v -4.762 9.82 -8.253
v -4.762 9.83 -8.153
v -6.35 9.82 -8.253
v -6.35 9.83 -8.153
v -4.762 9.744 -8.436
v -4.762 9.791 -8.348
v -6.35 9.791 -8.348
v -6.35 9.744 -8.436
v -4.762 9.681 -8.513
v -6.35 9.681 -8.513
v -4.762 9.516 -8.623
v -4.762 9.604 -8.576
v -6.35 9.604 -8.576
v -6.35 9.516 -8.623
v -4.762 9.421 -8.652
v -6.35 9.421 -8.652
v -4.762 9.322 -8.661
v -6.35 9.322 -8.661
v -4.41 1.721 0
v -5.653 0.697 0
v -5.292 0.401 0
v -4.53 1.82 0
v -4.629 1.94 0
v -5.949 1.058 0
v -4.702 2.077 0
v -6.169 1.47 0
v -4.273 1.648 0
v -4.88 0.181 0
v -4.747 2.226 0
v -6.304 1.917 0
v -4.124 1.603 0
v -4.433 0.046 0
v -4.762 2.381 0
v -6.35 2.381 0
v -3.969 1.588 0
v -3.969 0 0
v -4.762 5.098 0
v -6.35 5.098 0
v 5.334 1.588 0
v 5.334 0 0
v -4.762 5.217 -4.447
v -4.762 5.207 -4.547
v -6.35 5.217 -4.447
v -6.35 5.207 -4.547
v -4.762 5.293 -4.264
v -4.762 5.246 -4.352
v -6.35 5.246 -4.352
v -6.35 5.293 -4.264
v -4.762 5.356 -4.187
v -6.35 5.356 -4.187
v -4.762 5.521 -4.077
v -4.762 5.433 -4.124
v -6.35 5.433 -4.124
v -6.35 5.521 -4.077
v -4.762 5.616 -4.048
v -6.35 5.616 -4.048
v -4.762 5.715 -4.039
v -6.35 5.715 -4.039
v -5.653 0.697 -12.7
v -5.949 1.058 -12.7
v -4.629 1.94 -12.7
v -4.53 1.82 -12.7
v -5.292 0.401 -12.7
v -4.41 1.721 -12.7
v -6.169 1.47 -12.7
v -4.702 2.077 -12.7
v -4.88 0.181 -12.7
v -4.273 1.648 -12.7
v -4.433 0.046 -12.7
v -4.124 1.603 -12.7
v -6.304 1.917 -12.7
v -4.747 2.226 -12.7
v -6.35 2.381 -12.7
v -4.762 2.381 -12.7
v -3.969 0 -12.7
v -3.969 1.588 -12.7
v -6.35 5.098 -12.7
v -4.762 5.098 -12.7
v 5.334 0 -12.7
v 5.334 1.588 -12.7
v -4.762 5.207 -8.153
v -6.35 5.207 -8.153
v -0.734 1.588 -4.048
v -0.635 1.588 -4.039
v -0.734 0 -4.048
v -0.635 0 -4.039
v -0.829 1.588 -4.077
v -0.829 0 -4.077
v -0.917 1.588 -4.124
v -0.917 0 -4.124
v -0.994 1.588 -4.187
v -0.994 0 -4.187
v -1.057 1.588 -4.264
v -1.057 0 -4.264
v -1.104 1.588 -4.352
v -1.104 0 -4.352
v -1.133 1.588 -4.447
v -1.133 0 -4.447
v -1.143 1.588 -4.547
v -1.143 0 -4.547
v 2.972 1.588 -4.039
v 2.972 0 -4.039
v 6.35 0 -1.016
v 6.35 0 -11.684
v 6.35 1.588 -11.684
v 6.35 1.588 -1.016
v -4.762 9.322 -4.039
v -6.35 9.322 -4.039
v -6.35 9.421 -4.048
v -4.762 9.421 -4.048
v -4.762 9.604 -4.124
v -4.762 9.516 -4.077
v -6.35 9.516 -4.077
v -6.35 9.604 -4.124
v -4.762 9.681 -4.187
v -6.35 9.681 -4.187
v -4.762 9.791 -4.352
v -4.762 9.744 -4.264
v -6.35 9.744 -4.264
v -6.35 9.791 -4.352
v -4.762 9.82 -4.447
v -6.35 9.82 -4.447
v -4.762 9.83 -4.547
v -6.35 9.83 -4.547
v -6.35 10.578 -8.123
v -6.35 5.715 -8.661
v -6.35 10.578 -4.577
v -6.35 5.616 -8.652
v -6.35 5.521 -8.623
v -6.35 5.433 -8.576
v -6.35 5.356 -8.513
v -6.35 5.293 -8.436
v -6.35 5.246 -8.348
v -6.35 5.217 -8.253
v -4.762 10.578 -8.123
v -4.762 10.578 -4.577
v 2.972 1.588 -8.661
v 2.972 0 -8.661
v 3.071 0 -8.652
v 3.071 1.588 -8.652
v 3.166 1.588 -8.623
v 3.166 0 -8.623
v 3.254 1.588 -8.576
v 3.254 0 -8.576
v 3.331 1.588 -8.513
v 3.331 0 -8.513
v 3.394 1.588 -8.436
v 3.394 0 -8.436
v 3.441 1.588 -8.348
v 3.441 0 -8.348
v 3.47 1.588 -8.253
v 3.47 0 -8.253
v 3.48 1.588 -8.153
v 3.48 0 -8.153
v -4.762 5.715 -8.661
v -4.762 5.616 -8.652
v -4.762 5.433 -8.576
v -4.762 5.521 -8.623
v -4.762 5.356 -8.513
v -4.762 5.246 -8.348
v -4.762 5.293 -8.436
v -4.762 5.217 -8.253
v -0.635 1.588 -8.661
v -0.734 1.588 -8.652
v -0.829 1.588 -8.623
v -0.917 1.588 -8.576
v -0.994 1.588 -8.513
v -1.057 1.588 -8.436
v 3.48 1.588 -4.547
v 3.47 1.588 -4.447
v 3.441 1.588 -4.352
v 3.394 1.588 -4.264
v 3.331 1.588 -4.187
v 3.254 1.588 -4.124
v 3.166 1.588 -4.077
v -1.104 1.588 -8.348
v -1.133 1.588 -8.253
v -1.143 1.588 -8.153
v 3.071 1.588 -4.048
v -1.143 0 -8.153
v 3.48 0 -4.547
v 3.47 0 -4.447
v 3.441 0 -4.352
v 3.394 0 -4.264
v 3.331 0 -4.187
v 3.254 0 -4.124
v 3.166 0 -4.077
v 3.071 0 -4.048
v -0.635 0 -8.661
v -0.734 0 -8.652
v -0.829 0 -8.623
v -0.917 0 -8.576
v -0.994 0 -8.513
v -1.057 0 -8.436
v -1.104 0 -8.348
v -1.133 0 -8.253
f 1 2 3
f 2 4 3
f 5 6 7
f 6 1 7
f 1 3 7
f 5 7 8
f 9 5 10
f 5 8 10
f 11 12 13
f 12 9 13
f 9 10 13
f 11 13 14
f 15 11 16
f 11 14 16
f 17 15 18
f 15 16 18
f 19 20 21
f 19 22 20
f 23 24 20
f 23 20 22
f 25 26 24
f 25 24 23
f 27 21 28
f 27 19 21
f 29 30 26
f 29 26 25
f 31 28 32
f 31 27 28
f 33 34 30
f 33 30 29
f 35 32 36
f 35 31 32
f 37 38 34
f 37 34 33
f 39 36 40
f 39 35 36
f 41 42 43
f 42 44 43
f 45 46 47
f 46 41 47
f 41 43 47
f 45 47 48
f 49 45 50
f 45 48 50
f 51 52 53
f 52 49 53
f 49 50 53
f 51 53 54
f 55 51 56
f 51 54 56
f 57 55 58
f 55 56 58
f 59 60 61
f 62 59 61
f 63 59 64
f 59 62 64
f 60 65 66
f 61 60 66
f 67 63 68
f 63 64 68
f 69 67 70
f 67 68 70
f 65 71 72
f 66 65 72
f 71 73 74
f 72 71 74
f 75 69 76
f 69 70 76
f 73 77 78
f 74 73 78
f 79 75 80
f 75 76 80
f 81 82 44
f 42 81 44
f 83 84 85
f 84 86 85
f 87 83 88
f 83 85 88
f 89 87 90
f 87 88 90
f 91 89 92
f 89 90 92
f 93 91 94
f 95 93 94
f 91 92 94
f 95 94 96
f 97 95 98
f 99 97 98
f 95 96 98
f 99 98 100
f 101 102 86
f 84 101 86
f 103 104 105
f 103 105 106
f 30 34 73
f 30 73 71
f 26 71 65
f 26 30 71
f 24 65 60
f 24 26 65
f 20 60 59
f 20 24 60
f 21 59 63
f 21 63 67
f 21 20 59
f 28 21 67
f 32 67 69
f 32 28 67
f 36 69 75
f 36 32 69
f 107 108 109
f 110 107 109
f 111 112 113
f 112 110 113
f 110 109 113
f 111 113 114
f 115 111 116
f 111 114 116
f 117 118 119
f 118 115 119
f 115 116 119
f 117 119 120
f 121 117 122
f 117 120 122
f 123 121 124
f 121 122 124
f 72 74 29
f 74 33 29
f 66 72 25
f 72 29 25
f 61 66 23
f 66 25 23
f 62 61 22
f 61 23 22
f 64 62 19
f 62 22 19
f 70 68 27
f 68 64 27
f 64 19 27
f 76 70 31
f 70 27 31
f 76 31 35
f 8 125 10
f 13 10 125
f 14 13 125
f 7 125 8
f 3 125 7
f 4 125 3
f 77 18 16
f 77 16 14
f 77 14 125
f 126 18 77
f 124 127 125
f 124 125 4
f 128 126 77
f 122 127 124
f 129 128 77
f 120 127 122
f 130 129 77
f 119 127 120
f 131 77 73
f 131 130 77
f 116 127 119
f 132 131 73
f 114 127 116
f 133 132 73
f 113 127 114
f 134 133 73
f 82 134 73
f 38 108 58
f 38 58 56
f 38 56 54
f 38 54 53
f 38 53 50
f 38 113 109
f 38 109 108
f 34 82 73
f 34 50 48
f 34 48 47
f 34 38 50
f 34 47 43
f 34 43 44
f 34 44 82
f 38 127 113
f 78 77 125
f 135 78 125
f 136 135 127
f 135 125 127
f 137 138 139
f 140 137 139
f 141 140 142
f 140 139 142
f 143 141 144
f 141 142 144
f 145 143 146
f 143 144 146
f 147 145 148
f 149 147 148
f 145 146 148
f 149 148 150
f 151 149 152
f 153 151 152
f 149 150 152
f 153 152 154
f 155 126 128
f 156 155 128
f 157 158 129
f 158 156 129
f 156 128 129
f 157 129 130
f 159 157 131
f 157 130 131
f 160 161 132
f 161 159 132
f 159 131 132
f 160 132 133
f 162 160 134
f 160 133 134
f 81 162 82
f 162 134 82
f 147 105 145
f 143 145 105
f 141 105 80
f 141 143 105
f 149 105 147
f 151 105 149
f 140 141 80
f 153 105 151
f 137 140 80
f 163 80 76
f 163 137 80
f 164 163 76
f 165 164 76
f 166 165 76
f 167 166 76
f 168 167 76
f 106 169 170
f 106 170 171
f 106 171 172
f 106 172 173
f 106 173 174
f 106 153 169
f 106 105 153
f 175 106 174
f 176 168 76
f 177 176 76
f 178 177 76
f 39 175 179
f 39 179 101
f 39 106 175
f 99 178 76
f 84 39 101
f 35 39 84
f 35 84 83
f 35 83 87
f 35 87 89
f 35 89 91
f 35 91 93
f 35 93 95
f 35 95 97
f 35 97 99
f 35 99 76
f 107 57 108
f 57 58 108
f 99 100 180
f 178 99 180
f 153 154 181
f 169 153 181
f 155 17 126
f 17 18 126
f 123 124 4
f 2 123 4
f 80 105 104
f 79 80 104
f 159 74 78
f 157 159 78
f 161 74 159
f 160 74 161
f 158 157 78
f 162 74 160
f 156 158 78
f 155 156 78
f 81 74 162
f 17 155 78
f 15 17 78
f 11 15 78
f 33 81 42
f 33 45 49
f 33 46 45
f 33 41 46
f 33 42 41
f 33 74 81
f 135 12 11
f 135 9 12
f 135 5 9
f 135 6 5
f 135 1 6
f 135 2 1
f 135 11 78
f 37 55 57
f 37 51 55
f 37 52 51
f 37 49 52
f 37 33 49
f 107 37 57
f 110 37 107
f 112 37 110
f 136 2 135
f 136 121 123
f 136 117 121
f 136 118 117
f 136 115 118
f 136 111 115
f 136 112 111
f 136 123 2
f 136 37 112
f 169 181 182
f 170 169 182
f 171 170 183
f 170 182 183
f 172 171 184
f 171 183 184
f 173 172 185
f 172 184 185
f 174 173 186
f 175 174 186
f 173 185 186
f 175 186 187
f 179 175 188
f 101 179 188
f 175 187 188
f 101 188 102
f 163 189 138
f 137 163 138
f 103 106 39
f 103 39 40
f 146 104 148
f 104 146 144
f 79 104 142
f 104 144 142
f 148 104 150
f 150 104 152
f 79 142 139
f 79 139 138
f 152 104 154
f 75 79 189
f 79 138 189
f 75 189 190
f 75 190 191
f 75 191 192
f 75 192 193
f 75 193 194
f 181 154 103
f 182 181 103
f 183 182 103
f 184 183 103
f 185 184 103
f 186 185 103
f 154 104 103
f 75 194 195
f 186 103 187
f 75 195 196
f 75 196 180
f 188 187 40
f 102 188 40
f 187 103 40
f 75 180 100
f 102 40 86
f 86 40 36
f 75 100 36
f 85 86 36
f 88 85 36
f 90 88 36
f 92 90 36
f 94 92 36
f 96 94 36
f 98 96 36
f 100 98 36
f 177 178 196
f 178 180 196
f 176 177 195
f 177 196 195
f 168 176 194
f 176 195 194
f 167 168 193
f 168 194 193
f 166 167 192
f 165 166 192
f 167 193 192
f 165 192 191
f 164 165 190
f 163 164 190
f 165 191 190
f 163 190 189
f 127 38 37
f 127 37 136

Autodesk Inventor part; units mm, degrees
ref_plane "YZ Plane" through (0, 0, 0) normal (1, 0, 0) x (0, 1, 0)
ref_plane "XZ Plane" through (0, 0, 0) normal (0, 1, 0) x (-1, 0, 0)
sketch "Sketch1" plane through (0, 0, 0) normal (0, 1, 0) x (-1, 0, 0)
  line L0 (-6.35, 0) -> (6.35, 0)
  line L1 (6.35, 0) -> (6.35, -12.7)
  line L2 (6.35, -12.7) -> (-6.35, -12.7)
  line L3 (-6.35, -12.7) -> (-6.35, 0)
  line L4 (6.35, 0) -> (-6.35, -12.7) construction
  point P0 (0, 0)
  point P1 (0, 0)
  dimension "d0" = 12.7
  dimension "d1" = 12.7
extrude "Plate1" add sketch "Sketch1" along normal blind 1.5875
sketch "Sketch2" plane through (-4.7625, 0, 0) normal (-1, 0, 0) x (0, -1, 0)
  line L0 (0, -12.7) -> (0, 0)
  line L1 (0, 0) -> (-12.7, 0)
  line L2 (-12.7, 0) -> (-12.7, -12.7)
  line L3 (-12.7, -12.7) -> (0, -12.7)
edge flange "Flanges" height 12.7 angle 90 thickness 1.5875 bend radius 0.7937 thickness toward (-1, 0, 0) relief tear relief width 1.5875 relief depth 0.7937 edges at (-6.35, 1.5875, -6.35) wall of the first edge with corners at (-4.7625, 0, -12.7) (-4.7625, 0, 0) (-4.7625, 12.7, 0) (-4.7625, 12.7, -12.7)
bend "Bend1"
corner "Corner1"
sketch "Sketch8" plane through (0, 0, 0) normal (0, -1, 0) x (1, 0, 0)
  line L0 (6.35, 0) -> (-3.9687, 0) construction
  line L1 (2.9718, -4.0386) -> (-0.635, -4.0386)
  line L2 (-1.143, -4.5466) -> (-1.143, -8.1534)
  line L3 (-0.635, -8.6614) -> (2.9718, -8.6614)
  line L4 (3.4798, -8.1534) -> (3.4798, -4.5466)
  arc A0 (3.4798, -4.5466) -> (2.9718, -4.0386) centre (2.9718, -4.5466) ccw
  arc A1 (2.9718, -8.6614) -> (3.4798, -8.1534) centre (2.9718, -8.1534) ccw
  arc A2 (-1.143, -8.1534) -> (-0.635, -8.6614) centre (-0.635, -8.1534) ccw
  arc A3 (-0.635, -4.0386) -> (-1.143, -4.5466) centre (-0.635, -4.5466) ccw
  line L5 (2.9718, -4.5466) -> (-0.635, -8.1534) construction
  line L6 (6.35, -12.7) -> (6.35, 0) construction
  point P0 (0, 0)
  point P1 (-1.143, -8.6614)
  point P2 (3.4798, -8.6614)
  point P3 (12.7, 0)
  point P4 (1.1684, -6.35)
  dimension "d49" = 4.6228
  dimension "d50" = 0.508
  dimension "d52" = 6.35
  dimension "d123" = 5.1816
extrude "Body Stamp" cut sketch "Sketch8" against normal blind 1.5875
sketch "Sketch9" plane through (0, 0, 0) normal (0, -1, 0) x (1, 0, 0)
  arc A0 (3.4798, -4.5466) -> (2.9718, -4.0386) centre (2.9718, -4.5466) ccw construction
  arc A1 (-1.143, -8.1534) -> (-0.635, -8.6614) centre (-0.635, -8.1534) ccw construction
  line L0 (2.9718, -4.5466) -> (-0.635, -8.1534) construction
  circle A2 centre (1.1684, -6.35) radius 2.1844
  point P0 (0, 0)
  dimension "d55" = 4.3688
surface extrude "Body Circle" sketch "Sketch9" against normal up to surface (1.5875 mm away) shown yes curves A2
pattern_sketch "Body Pattern" of "Body Stamp", "Body Circle" from (1.1684, 0, -6.35) copies at (1.1684, 0, -19.05) at (1.1684, 0, -31.75) at (1.1684, 0, -44.45) at (1.1684, 0, -57.15) at (1.1684, 0, -69.85) at (1.1684, 0, -82.55) at (1.1684, 0, -95.25) at (1.1684, 0, -107.95) at (1.1684, 0, -120.65) at (1.1684, 0, -133.35) at (1.1684, 0, -146.05) at (1.1684, 0, -158.75) at (1.1684, 0, -171.45) at (1.1684, 0, -184.15) at (1.1684, 0, -196.85) at (1.1684, 0, -209.55) at (1.1684, 0, -222.25) at (1.1684, 0, -234.95) at (1.1684, 0, -247.65) at (1.1684, 0, -260.35) at (1.1684, 0, -273.05) at (1.1684, 0, -285.75) at (1.1684, 0, -298.45) at (1.1684, 0, -311.15) at (1.1684, 0, -323.85) at (1.1684, 0, -336.55) at (1.1684, 0, -349.25) at (1.1684, 0, -361.95) at (1.1684, 0, -374.65) at (1.1684, 0, -387.35) at (1.1684, 0, -400.05) at (1.1684, 0, -412.75) at (1.1684, 0, -425.45) at (1.1684, 0, -438.15)
sketch "Arc Length" plane through (19.05, 2.3812, 0) normal (0, 0, 1) x (1, 0, 0)
  line L0 (-25.4, 0) -> (-23.8125, 0) projected
  arc A0 (-25.4, 0) -> (-23.0187, -2.3813) centre (-23.0187, 0) ccw projected
  line L1 (-23.0187, -0.7938) -> (-23.0187, -2.3813) projected
  arc A1 (-23.8125, 0) -> (-23.0187, -0.7938) centre (-23.0187, 0) ccw projected
  point P0 (-19.05, -2.3812)
  dimension "d126" = 1.2468
  dimension "d127" = 3.7405
sketch "Sketch13" plane through (-6.35, 0, 431.8) normal (1, 0, 0) x (0, 0, -1)
  line L0 (493.268, 12.7) -> (495.3, 10.668)
  line L1 (495.3, 10.668) -> (497.332, 12.7)
  line L2 (493.268, 12.7) -> (497.332, 12.7)
  line L3 (495.3, 3.3973) -> (493.0372, 1.1344)
  line L4 (493.0372, 1.1344) -> (495.3, -1.1284)
  line L5 (495.3, -1.1284) -> (497.5628, 1.1344)
  line L6 (497.5628, 1.1344) -> (495.3, 3.3973)
  line L7 (495.3, 3.3973) -> (495.3, -1.1284) construction
  line L8 (495.3, 10.668) -> (495.3, 3.3973) construction
  line L9 (444.5, 12.7) -> (431.8, 12.7) projected
  line L10 (444.5, 2.3813) -> (431.8, 2.3813) construction
  line L11 (431.8, 12.7) -> (431.8, 2.3813) construction
  point P0 (444.5, -11.9062)
  point P1 (431.8, 0)
  dimension "d86" = 4.5256
  dimension "d128" = 2.032
  dimension "d129" = 1.016
  dimension "d130" = 63.5
feature "Notch" [suppressed]
pattern_linear "Notch Pattern" [suppressed]
ref_plane "Diagonal Plane" through (-4.7625, 1.5875, 0) normal (-0.7071068, 0.7071068, 0) x (0, 0, 1)
mirror "Everything Mirrored" about plane through (-4.7625, 1.5875, 0) normal (-0.7071068, 0.7071068, 0) of "Body Stamp", "Body Circle", "Body Pattern"
chamfer "End Chamfer" distance 1.016 angle 45 4 edges at (-5.5562, 12.7, -12.7) (-5.5562, 12.7, 0) (6.35, 0.7937, 0) (6.35, 0.7937, -12.7)
sketch "Sketch17" plane through (-6.35, 2.3813, -12.7) normal (-1, 0, 0) x (0, 0, 1)
  line L0 (12.7, 9.3028) -> (12.7, 0) construction
  line L1 (0, 0) -> (0, 9.3027) construction
  line L2 (1.016, 10.3187) -> (11.684, 10.3188) construction
  line L3 (0, 2.7171) -> (4.577, 8.1963)
  line L4 (6.35, 1.587) -> (6.35, 9.3027) construction
  line L5 (12.7, 2.7171) -> (8.123, 8.1963)
  line L6 (4.577, 8.1963) -> (8.123, 8.1963)
  line L7 (0, 2.7171) -> (0, 10.3187)
  line L8 (0, 10.3187) -> (12.7, 10.3187)
  line L9 (12.7, 10.3187) -> (12.7, 2.7171)
  point P0 (12.7, -2.3812)
extrude "Extrusion2" cut sketch "Sketch17" against normal blind 1.5875
sketch "Body Pattern Sketch" plane through (0, 0, 0) normal (0, -1, 0) x (1, 0, 0)
  line L0 (1.1684, -6.35) -> (1.1684, 0) construction
  circle A0 centre (1.1684, -6.35) radius 2.1844 construction
  point P0 (1.1684, -19.05)
  point P1 (1.1684, -31.75)
  point P2 (1.1684, -44.45)
  point P3 (1.1684, -57.15)
  point P4 (1.1684, -69.85)
  point P5 (1.1684, -82.55)
  point P6 (1.1684, -95.25)
  point P7 (1.1684, -107.95)
  point P8 (1.1684, -120.65)
  point P9 (1.1684, -133.35)
  point P10 (1.1684, -146.05)
  point P11 (1.1684, -158.75)
  point P12 (1.1684, -171.45)
  point P13 (1.1684, -184.15)
  point P14 (1.1684, -196.85)
  point P15 (1.1684, -209.55)
  point P16 (1.1684, -222.25)
  point P17 (1.1684, -234.95)
  point P18 (1.1684, -247.65)
  point P19 (1.1684, -260.35)
  point P20 (1.1684, -273.05)
  point P21 (1.1684, -285.75)
  point P22 (1.1684, -298.45)
  point P23 (1.1684, -311.15)
  point P24 (1.1684, -323.85)
  point P25 (1.1684, -336.55)
  point P26 (1.1684, -349.25)
  point P27 (1.1684, -361.95)
  point P28 (1.1684, -374.65)
  point P29 (1.1684, -387.35)
  point P30 (1.1684, -400.05)
  point P31 (1.1684, -412.75)
  point P32 (1.1684, -425.45)
  point P33 (1.1684, -438.15)
  dimension "d133" = 12.7
equation "\"d1\" = 12.7 * Length"
equation "\"d53\" = Thickness"
equation "\"d89\" = Thickness"
equation "\"d2\" = Thickness"
equation "\"d3\" = BendReliefWidth"
equation "\"d4\" = BendReliefDepth"
equation "\"d5\" = MinimumRemnant"
equation "\"d6\" = TransitionRadius"
equation "\"d10\" = CornerReliefSize"
equation "\"d11\" = GapSize"
equation "\"d12\" = JacobiRadiusSize"
equation "\"BendRadius\" = Thickness"
equation "\"BendReliefWidth\" = Thickness"
equation "\"BendReliefDepth\" = 0.5 * Thickness"
equation "\"CornerReliefSize\" = 4 * Thickness"
equation "\"MinimumRemnant\" = 2 * Thickness"
equation "\"TransitionRadius\" = BendRadius"
equation "\"JacobiRadiusSize\" = BendRadius"
equation "\"GapSize\" = Thickness"
equation "\"Length\" = 1"
equation "\"Thickness\" = 1.5875"
properties part number "Alu C 1x2x1x35"
